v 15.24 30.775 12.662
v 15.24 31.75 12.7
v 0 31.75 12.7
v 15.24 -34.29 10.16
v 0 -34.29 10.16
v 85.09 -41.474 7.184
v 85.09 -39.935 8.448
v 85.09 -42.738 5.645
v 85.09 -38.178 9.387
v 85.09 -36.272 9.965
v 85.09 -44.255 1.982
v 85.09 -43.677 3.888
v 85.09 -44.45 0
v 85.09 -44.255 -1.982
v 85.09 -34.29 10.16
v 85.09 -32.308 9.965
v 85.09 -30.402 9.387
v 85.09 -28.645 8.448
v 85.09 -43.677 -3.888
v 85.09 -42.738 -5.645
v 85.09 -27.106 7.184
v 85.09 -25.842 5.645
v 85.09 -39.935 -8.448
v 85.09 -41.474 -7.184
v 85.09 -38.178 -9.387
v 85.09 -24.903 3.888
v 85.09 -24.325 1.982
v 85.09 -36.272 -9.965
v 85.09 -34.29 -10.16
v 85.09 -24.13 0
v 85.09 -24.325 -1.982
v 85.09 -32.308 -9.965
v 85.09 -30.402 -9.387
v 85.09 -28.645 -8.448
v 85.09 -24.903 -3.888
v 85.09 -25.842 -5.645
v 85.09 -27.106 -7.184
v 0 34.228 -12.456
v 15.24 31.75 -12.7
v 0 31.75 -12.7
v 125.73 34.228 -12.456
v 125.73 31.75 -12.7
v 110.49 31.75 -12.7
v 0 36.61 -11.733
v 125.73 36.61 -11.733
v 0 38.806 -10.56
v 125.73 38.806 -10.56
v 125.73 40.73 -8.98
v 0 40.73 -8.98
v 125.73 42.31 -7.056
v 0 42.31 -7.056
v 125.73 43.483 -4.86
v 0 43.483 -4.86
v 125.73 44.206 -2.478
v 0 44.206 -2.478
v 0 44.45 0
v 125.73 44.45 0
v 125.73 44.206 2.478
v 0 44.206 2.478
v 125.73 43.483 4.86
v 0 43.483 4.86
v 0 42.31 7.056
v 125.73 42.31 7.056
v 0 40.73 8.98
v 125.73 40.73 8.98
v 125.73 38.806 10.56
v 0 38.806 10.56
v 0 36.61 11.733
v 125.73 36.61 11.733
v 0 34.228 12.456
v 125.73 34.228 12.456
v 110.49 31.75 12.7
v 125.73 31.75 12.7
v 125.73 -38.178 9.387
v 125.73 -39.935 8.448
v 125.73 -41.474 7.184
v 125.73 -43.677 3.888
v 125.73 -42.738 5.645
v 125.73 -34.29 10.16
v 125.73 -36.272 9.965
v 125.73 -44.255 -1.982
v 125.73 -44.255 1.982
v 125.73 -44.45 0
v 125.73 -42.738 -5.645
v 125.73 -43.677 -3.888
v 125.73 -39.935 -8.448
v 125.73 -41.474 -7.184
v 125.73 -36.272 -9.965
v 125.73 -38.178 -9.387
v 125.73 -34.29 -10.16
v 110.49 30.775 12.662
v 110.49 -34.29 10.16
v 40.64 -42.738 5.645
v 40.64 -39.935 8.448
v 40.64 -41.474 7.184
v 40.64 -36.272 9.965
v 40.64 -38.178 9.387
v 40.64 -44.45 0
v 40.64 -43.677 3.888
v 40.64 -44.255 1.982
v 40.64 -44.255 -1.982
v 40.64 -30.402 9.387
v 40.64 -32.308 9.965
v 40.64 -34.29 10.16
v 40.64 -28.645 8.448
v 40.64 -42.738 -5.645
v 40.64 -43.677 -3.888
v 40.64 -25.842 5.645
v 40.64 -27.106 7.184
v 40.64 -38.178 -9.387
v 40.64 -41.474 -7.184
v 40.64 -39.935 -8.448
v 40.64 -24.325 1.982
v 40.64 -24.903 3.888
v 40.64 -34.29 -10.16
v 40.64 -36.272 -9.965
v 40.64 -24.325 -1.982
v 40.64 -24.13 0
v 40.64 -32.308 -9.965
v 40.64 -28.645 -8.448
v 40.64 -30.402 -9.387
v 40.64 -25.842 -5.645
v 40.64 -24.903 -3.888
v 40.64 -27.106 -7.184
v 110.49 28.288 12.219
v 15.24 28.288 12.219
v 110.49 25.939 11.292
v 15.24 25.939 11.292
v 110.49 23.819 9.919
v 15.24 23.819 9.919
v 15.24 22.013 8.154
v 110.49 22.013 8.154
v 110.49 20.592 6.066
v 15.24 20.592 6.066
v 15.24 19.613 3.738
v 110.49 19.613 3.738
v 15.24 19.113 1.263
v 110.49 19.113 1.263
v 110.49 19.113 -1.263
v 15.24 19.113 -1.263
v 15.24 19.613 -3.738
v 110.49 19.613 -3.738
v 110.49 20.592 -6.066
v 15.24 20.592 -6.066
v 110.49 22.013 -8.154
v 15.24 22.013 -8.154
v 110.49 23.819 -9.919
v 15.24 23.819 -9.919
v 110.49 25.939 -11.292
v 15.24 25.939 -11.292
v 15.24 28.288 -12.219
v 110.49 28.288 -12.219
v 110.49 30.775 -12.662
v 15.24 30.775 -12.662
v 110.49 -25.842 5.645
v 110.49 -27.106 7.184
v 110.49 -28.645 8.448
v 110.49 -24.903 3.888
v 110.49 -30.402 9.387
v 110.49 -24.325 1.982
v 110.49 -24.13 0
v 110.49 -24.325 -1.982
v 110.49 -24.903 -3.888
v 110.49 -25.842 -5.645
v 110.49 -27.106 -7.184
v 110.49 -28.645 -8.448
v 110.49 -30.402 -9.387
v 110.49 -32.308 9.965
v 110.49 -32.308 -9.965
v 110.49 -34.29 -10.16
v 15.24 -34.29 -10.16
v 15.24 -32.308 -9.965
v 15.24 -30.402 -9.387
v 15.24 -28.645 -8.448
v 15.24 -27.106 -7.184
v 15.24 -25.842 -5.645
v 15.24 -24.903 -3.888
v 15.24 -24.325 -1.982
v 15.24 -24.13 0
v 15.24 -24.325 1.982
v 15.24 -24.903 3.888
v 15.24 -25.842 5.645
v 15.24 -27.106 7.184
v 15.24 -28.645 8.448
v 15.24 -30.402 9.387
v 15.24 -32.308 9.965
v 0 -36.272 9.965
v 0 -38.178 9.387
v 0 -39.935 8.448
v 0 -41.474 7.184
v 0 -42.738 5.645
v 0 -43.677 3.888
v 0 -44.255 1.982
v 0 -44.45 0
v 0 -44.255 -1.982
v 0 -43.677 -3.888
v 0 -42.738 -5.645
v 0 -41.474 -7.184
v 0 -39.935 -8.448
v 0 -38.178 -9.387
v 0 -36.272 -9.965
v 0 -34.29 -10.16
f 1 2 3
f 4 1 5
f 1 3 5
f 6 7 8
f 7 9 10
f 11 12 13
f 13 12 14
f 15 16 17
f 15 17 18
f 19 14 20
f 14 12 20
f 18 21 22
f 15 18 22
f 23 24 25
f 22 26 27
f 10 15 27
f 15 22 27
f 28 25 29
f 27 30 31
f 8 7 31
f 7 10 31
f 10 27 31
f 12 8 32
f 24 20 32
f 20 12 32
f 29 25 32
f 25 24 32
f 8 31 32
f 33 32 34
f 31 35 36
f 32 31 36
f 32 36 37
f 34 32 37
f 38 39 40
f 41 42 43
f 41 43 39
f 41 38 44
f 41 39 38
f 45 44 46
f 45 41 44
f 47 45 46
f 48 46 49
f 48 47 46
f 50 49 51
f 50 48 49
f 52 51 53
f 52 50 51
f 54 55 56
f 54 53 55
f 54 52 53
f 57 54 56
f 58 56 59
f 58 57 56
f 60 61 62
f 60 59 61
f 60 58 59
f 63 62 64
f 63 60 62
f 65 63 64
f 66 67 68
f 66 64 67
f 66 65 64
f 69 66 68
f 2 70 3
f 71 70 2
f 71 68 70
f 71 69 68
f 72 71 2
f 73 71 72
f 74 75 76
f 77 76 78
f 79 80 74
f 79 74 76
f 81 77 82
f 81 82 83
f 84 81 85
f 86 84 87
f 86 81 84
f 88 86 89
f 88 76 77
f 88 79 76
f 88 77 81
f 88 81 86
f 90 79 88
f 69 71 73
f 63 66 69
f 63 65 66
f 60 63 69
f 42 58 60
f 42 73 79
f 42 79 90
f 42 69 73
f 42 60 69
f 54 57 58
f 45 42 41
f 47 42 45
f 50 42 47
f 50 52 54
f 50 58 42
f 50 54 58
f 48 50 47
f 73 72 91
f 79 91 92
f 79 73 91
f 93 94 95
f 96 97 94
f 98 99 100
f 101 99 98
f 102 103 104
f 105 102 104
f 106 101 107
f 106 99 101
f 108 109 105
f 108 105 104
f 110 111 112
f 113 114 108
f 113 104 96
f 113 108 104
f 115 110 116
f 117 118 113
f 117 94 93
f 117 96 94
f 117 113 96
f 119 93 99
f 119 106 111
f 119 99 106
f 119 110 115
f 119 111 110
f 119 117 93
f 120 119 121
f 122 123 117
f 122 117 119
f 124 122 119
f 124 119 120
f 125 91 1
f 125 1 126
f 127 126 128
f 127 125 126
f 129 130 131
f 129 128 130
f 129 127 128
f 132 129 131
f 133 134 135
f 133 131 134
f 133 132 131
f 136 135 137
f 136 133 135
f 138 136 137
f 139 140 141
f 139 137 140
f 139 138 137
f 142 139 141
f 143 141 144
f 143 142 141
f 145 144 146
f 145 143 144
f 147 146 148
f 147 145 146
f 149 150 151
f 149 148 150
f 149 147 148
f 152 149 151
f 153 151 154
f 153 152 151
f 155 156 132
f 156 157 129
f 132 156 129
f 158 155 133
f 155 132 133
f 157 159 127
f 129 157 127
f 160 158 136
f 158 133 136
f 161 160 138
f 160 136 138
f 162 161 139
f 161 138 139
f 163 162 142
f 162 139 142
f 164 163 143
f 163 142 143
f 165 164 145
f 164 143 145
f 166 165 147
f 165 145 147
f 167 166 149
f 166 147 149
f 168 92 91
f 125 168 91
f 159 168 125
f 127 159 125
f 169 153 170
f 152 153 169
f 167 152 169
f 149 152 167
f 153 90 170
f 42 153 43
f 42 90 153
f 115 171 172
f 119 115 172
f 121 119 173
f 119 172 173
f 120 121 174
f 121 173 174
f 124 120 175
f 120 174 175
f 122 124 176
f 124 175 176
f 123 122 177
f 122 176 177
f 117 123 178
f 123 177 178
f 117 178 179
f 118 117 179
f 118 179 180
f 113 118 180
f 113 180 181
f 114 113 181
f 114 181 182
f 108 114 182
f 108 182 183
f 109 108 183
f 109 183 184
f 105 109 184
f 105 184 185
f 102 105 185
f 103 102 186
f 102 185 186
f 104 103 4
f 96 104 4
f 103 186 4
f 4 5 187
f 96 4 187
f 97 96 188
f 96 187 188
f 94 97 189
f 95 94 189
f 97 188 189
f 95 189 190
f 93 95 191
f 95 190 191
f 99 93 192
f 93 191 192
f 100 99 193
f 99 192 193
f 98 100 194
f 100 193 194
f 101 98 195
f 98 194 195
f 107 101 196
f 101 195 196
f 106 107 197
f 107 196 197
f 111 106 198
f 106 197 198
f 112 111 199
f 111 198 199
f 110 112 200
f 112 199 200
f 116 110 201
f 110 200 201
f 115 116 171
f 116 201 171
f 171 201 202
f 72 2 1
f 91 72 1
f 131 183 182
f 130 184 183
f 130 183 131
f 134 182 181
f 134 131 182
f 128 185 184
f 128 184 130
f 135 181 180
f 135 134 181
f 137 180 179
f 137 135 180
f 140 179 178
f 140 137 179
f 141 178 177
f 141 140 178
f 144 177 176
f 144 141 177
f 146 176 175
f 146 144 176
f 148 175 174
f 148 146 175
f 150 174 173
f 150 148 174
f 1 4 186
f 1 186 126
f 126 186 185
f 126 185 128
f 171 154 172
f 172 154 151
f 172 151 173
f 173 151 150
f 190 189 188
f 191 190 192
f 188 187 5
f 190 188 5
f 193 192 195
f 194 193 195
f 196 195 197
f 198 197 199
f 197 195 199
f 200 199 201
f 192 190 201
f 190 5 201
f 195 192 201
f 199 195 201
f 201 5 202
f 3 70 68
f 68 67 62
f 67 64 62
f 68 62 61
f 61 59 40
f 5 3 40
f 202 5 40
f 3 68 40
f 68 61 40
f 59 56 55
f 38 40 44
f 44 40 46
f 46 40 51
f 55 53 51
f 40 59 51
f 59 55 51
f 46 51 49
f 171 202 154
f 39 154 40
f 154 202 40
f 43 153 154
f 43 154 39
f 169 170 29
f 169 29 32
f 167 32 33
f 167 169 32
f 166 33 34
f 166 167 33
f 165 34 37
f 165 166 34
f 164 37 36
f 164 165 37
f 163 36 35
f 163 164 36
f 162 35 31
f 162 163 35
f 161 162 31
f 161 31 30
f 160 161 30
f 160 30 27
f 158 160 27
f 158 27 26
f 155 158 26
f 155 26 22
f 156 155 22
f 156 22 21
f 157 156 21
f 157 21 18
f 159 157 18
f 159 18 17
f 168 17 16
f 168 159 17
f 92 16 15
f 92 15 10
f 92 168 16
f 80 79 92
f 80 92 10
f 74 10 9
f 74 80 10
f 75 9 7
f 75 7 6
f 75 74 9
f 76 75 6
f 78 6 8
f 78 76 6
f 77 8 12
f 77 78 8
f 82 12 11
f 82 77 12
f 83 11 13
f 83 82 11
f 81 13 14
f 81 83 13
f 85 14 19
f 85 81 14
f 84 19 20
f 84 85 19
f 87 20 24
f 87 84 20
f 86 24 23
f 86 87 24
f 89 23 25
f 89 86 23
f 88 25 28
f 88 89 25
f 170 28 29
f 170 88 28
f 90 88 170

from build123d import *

# Parameters (mm, degrees)
BOSS_EXTRUDE4_DEPTH = 15.24
BOSS_EXTRUDE5_DEPTH = 62.865
SKETCH2_11_R        = 10.16
BOSS_EXTRUDE6_DEPTH = 40.64


with BuildPart() as part:
    # Sketch2 → Boss-Extrude4 (new body)
    with BuildSketch(Plane(origin=(0, 0, 0), x_dir=(0, 0, -1), z_dir=(1, 0, 0))):
        with BuildLine():
            Line((10.16, -34.29), (12.7, 31.75))
            ThreePointArc((12.7, 31.75), (0, 44.45), (-12.7, 31.75))
            Line((-12.7, 31.75), (-10.16, -34.29))
            ThreePointArc((-10.16, -34.29), (0, -44.45), (10.16, -34.29))
        make_face()
    extrude(amount=BOSS_EXTRUDE4_DEPTH)

    # Sketch2<9> → Boss-Extrude5 (add)
    with BuildSketch(Plane(origin=(0, 0, 0), x_dir=(0, 0, -1), z_dir=(1, 0, 0))):
        with BuildLine():
            Line((12.662481536, 30.774519941), (12.7, 31.75))
            ThreePointArc((12.7, 31.75), (8.98025611, 40.730256132), (-3e-08, 44.45))
            ThreePointArc((-3e-08, 44.45), (-8.980256132, 40.73025611), (-12.7, 31.75))
            Line((-12.7, 31.75), (-12.662481536, 30.774519941))
            ThreePointArc((-12.662481536, 30.774519941), (0, 19.05), (12.662481536, 30.774519941))
        make_face()
    extrude(amount=BOSS_EXTRUDE5_DEPTH)

    # Sketch2<11> → Boss-Extrude6 (add)
    with BuildSketch(Plane(origin=(0, 0, 0), x_dir=(0, 0, -1), z_dir=(1, 0, 0))):
        with Locations((0, -34.29)):
            Circle(SKETCH2_11_R)
    extrude(amount=BOSS_EXTRUDE6_DEPTH)

    # Mirror1: part across plane


with BuildPart() as part_1:
    add(part.part)
    add(part.part.mirror(Plane(origin=(62.865, 0, 0), x_dir=(0, 0, 1), z_dir=(1, 0, 0))))


solid = part_1.part
